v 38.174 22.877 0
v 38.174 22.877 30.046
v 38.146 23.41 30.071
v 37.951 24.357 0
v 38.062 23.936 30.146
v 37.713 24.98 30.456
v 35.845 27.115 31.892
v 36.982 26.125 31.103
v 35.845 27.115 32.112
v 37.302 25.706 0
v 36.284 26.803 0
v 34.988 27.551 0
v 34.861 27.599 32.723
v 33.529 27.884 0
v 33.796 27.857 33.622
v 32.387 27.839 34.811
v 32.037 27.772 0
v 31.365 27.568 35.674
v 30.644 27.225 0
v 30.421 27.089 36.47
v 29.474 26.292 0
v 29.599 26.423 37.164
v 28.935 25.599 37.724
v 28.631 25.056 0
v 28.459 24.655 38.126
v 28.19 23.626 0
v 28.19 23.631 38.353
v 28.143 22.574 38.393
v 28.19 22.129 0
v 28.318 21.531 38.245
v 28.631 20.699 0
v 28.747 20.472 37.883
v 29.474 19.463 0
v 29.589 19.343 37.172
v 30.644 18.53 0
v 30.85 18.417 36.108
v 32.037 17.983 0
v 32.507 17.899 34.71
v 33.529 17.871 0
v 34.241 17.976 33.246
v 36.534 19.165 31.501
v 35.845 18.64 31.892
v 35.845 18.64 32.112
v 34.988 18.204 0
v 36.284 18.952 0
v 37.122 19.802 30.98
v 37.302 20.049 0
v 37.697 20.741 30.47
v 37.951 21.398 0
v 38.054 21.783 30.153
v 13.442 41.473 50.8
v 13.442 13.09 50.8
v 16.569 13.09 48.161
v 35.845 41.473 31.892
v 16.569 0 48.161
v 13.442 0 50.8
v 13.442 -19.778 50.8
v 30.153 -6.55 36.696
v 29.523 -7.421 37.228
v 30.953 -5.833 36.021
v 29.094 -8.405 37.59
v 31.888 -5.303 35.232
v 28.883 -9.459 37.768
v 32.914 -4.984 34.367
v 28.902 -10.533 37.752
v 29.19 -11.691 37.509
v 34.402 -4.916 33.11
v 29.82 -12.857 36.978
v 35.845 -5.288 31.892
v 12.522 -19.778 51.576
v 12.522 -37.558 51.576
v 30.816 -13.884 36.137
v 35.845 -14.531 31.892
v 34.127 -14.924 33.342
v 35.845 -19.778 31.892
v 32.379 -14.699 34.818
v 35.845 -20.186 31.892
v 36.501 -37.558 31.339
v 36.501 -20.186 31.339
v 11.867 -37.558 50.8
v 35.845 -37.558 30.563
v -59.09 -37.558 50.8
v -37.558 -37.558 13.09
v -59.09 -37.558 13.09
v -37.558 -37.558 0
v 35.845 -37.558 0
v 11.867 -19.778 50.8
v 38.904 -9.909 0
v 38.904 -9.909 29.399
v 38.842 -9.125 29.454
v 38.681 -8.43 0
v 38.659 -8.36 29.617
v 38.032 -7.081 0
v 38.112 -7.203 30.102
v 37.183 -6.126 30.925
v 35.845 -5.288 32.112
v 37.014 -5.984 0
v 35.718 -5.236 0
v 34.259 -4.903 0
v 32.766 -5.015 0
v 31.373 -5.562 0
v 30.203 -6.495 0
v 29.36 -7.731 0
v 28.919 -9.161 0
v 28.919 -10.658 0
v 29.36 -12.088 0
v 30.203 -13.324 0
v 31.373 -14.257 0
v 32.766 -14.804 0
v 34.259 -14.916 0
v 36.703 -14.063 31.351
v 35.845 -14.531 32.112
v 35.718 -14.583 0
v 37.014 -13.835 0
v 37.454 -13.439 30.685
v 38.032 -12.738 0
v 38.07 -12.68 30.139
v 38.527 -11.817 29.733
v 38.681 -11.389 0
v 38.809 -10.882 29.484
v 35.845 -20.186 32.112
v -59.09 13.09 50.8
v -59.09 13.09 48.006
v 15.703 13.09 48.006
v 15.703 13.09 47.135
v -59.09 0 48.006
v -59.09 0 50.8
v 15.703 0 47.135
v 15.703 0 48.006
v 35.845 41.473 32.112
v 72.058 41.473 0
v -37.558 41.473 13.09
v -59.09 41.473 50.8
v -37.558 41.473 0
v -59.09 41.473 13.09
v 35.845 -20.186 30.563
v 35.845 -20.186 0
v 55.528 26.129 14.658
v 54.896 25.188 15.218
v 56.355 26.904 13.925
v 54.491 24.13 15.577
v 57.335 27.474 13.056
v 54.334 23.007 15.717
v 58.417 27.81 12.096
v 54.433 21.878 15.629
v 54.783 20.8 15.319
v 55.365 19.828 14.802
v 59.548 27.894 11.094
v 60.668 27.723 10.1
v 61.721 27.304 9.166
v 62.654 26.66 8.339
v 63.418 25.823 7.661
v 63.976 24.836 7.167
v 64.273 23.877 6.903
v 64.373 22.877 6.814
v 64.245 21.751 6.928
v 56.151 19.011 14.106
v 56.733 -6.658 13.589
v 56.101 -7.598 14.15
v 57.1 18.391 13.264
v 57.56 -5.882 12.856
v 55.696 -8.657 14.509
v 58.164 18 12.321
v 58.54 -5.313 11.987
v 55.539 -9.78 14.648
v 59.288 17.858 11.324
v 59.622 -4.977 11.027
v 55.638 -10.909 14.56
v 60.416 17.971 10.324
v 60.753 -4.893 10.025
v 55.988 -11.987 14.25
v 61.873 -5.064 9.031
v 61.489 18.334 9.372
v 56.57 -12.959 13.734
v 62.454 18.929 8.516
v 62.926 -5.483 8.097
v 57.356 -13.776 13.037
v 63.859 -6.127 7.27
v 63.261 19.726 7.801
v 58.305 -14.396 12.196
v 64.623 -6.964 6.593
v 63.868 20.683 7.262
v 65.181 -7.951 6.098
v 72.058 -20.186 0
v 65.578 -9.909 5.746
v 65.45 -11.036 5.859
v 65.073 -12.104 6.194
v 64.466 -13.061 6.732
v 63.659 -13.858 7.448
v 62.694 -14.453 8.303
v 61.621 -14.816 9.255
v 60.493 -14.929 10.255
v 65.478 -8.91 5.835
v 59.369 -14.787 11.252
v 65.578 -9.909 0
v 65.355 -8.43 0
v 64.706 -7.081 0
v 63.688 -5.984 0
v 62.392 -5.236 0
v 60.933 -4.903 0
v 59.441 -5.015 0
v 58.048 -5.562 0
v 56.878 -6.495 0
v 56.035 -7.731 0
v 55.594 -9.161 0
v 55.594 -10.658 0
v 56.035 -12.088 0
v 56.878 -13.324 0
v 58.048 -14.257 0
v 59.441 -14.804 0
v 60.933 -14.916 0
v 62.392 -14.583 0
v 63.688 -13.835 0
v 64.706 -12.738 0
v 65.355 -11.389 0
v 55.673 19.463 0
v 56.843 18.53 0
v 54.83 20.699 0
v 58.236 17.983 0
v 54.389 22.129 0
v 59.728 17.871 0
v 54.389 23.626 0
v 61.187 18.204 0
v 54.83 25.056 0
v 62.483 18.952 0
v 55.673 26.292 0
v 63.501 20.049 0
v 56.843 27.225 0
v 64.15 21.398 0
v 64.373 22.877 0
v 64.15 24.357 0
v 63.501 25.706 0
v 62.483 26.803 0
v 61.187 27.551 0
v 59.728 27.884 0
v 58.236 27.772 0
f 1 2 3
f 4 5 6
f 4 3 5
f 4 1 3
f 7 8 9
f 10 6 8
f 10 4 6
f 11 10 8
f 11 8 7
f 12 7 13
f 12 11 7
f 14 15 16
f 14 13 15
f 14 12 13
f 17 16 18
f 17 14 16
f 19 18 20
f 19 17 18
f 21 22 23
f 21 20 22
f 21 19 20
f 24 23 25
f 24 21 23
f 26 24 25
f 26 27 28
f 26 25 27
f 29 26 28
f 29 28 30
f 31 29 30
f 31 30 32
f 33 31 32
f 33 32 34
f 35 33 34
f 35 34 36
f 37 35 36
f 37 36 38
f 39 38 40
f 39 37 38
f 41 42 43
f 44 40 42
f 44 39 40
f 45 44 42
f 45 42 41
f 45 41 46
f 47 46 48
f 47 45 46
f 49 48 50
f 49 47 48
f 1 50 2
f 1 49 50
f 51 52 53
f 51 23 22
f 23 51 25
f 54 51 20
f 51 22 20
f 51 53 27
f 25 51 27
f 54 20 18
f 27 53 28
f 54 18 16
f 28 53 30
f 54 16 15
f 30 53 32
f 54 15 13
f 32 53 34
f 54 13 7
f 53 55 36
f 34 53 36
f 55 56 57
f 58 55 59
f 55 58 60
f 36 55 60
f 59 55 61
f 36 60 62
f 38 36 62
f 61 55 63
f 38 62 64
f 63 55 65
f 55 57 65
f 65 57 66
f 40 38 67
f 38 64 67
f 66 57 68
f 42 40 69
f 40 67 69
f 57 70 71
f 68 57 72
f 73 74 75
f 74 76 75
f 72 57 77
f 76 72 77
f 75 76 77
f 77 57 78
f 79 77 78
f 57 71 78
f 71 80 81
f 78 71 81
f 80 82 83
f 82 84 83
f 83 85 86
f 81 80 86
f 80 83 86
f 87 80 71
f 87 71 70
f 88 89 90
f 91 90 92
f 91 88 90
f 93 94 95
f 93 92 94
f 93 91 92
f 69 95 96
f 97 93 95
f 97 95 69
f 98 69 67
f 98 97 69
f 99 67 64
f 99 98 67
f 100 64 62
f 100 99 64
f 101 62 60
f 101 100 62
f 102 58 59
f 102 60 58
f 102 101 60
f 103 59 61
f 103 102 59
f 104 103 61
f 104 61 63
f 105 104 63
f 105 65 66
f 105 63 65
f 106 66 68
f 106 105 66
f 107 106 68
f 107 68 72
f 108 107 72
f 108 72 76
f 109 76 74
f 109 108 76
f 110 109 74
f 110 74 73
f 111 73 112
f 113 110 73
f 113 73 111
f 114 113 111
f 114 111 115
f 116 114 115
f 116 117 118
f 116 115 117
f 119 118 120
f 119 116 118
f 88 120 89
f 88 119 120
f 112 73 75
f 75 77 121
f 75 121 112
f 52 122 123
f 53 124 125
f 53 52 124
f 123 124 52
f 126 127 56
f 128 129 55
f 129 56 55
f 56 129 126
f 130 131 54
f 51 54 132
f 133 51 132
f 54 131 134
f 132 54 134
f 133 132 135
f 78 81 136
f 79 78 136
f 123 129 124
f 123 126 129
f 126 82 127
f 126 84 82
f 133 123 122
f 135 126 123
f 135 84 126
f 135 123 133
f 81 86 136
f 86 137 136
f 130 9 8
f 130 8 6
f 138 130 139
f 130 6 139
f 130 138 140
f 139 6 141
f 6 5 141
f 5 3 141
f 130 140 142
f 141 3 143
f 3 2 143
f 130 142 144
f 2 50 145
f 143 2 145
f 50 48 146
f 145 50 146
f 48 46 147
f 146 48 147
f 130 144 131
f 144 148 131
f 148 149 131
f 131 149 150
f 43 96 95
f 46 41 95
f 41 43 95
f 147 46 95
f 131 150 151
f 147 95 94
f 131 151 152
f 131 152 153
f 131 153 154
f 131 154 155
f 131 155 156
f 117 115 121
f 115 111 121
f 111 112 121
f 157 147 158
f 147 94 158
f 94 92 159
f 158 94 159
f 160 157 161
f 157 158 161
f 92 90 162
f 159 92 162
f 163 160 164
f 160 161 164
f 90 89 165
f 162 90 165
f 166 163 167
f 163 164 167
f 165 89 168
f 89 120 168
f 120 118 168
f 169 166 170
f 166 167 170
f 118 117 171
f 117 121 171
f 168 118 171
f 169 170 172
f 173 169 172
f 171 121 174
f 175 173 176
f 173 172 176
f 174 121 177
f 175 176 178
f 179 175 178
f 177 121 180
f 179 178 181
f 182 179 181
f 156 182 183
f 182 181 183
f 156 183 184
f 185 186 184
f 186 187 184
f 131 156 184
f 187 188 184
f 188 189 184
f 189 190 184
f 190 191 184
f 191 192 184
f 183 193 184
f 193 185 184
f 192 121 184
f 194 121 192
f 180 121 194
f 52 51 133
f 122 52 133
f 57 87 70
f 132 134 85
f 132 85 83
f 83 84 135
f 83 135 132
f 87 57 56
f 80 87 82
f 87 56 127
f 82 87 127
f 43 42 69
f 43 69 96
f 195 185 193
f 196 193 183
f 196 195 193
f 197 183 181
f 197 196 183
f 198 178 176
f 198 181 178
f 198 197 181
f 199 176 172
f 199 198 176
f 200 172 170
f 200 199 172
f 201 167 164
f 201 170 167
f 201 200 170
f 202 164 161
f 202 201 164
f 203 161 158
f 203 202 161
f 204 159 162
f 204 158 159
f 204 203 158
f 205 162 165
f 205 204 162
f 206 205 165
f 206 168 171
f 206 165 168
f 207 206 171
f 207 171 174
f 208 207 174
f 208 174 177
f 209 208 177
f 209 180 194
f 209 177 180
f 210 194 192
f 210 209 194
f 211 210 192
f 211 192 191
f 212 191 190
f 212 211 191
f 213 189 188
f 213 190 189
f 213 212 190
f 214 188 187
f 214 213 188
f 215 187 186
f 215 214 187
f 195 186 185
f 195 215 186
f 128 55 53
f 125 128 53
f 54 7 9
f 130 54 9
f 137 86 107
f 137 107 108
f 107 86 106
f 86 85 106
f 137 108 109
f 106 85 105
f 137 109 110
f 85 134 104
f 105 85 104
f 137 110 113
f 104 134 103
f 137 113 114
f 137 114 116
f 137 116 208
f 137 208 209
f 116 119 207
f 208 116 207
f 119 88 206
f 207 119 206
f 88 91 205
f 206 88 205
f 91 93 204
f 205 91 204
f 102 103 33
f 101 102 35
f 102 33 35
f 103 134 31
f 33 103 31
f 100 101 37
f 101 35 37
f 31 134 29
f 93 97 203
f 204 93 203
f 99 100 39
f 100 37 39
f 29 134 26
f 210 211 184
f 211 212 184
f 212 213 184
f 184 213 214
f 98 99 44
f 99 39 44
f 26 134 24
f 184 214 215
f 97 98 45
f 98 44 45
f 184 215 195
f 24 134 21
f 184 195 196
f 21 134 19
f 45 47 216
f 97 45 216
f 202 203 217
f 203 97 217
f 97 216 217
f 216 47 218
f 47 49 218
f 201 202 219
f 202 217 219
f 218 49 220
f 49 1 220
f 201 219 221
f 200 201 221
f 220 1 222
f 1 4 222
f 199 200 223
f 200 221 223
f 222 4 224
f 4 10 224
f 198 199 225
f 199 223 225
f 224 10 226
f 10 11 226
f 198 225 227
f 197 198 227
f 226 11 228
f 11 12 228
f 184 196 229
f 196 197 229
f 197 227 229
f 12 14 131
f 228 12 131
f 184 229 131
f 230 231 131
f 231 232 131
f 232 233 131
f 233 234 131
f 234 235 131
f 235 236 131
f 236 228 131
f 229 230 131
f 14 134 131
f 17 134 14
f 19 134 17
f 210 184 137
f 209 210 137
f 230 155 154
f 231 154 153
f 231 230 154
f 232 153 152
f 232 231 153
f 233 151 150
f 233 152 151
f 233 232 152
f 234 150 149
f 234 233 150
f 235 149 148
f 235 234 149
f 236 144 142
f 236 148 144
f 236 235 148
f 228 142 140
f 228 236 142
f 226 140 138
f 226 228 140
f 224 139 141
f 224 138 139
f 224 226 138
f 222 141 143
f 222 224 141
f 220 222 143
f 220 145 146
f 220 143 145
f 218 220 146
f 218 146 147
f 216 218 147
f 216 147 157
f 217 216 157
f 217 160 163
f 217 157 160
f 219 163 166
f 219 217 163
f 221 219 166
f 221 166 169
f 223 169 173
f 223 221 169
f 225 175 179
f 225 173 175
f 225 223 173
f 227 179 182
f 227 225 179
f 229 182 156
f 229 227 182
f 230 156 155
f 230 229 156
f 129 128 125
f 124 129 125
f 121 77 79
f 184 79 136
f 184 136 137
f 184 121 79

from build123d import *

# Parameters (mm, degrees)
F0_R      = 5.0203932543
F0_W      = 36.212477833
F0_H      = 17.3722021282
F1_DEPTH  = 50.8
F2_W      = 36.2125001848
F2_H      = 17.3722039908
F3_DEPTH  = 50.8
F5_DEPTH  = 50.8
F7_DEPTH  = 50.8
F8_DEPTH  = 68.58
F9_DEPTH  = 1.016
F11_DEPTH = 63.5
F12_W     = 21.5317420661
F12_H     = 13.0903217942
F13_DEPTH = 76.2
F14_DEPTH = 25.4
F15_W     = 72.532140549
F15_H     = 13.0903217942
F16_DEPTH = 12.7
F17_W     = 4.0916903161
F17_H     = 13.0903217942
F18_DEPTH = 12.7
F19_DEPTH = 6.35
F20_DEPTH = 5.08
F21_DEPTH = 2.2606
F22_DEPTH = 2.032
F23_DEPTH = 1.524
F24_DEPTH = 1.016


with BuildPart() as f1:
    # F0 (on Top) → F1 (new body)
    with BuildSketch(Plane.XY):
        Polygon((-59.0899549425, 41.4730757475), (-59.0899549425, -37.5582128763), (35.8454622328, -37.5582128763), (35.8454622328, -20.1860107481), (72.0579400659, -20.1860107481), (72.0579400659, 41.4730757475), align=None)
        with Locations((33.8835379278, -9.9094957113)):
            Circle(F0_R, mode=Mode.SUBTRACT)
        with Locations((60.5580285192, -9.9094957113)):
            Circle(F0_R, mode=Mode.SUBTRACT)
        with Locations((33.153988421, 22.8774771094)):
            Circle(F0_R, mode=Mode.SUBTRACT)
        with Locations((59.3529156527, 22.8774771094)):
            Circle(F0_R, mode=Mode.SUBTRACT)
        with Locations((53.9517011493, -28.8721118122)):
            Rectangle(F0_W, F0_H)
    extrude(amount=F1_DEPTH)

    # F2 (on face) → F3 (cut)
    with BuildSketch(Plane.XY.offset(50.8)):
        with Locations((53.9516899735, -28.8721108809)):
            Rectangle(F2_W, F2_H)
    extrude(amount=-F3_DEPTH, mode=Mode.SUBTRACT)

    # F4 (on face) → F5 (join)
    with BuildSketch(Plane.XZ.offset(37.5582128763)):
        Polygon((11.8669271469, 50.8), (35.8454398811, 30.5626192379), (35.8454398811, 50.8), align=None)
    extrude(amount=F5_DEPTH)

    # F6 (on face) → F7 (cut)
    with BuildSketch(Plane.XY):
        Polygon((-59.0899549425, 40.9865353048), (-60.1052679121, 25.7568676025), (-59.0899549425, 25.7568676025), align=None)
        Polygon((-59.0484701097, 41.6088066995), (-59.0575188558, 41.4730757475), (-25.7593989372, 41.4730757475), (-25.7593989372, 41.6088066995), align=None)
        Polygon((-59.0899549425, 40.9865353048), (-59.0899549425, 25.7568676025), (-25.7593989372, 25.7568676025), (-25.7593989372, 41.4730757475), (-59.0575188558, 41.4730757475), align=None)
    extrude(amount=-F7_DEPTH, mode=Mode.SUBTRACT)

    # F8 (cut): a face of the model
    f8_faces = [f1.faces().sort_by_distance(p)[0] for p in [
        (27.852602303, -88.3582128763, 44.0542064126),
    ]]
    extrude(f8_faces, amount=-F8_DEPTH, mode=Mode.SUBTRACT)

    # F9 (add): a face of the model
    f9_faces = [f1.faces().sort_by_distance(p)[0] for p in [
        (23.856183514, -28.6682128763, 40.681309619),
    ]]
    extrude(f9_faces, amount=F9_DEPTH)

    # F8_face1 (on face) + F10 (on face) → F11 (cut)
    with BuildSketch(Plane(origin=(28.3776884562, -19.7782128763, 44.4973685275), x_dir=(1, 0, 0), z_dir=(0, -1, 0))):
        Polygon((7.4677514249, -12.6052629449), (7.4677514249, 6.3026314725), (-14.9355028497, 6.3026314725), align=None)
    with BuildSketch(Plane.XZ.offset(20.1860088855)):
        Polygon((35.8454398811, 32.1115117159), (72.0579400659, 0), (72.0579400659, 50.8), (35.8454398811, 50.8), align=None)
    extrude(amount=-F11_DEPTH, mode=Mode.SUBTRACT)

    # F12 (on face) → F13 (cut)
    with BuildSketch(Plane.XZ.offset(37.5582128763)):
        with Locations((-48.3240839094, 6.5451608971)):
            Rectangle(F12_W, F12_H)
    extrude(amount=-F13_DEPTH, mode=Mode.SUBTRACT)

    # F14 (cut): a face of the model
    f14_faces = [f1.faces().sort_by_distance(p)[0] for p in [
        (-48.3240839094, 38.6417871237, 6.5451608971),
    ]]
    extrude(f14_faces, amount=-F14_DEPTH, mode=Mode.SUBTRACT)

    # F15 (on face) → F16 (cut)
    with BuildSketch(Plane.XY.offset(50.8)):
        with Locations((-22.823884668, 6.5451608971)):
            Rectangle(F15_W, F15_H)
    extrude(amount=-F16_DEPTH, mode=Mode.SUBTRACT)

    # F17 (on face) → F18 (cut)
    with BuildSketch(Plane(origin=(30.6307366038, 0, 36.2932098944), x_dir=(0.7642049157, 0, -0.6449735241), z_dir=(0.6449735241, 0, 0.7642049157))):
        with Locations((-20.446225546, 6.5451608971)):
            Rectangle(F17_W, F17_H)
    extrude(amount=-F18_DEPTH, mode=Mode.SUBTRACT)

    # F19 (add): a face of the model
    f19_faces = [f1.faces().sort_by_distance(p)[0] for p in [
        (-22.823884668, 6.5451608971, 38.1),
    ]]
    extrude(f19_faces, amount=F19_DEPTH)

    # F20 (add): a face of the model
    f20_faces = [f1.faces().sort_by_distance(p)[0] for p in [
        (-22.823884668, 6.5451608971, 44.45),
    ]]
    extrude(f20_faces, amount=F20_DEPTH)

    # F21 (add): a face of the model
    f21_faces = [f1.faces().sort_by_distance(p)[0] for p in [
        (13.4421856065, 6.5451608971, 46.9930168384),
    ]]
    extrude(f21_faces, amount=F21_DEPTH)

    # F22 (cut): a face of the model
    f22_faces = [f1.faces().sort_by_distance(p)[0] for p in [
        (-21.693584668, 6.5451608971, 49.53),
    ]]
    extrude(f22_faces, amount=-F22_DEPTH, mode=Mode.SUBTRACT)

    # F23 (add): a face of the model
    f23_faces = [f1.faces().sort_by_distance(p)[0] for p in [
        (-21.693584668, 6.5451608971, 47.498),
    ]]
    extrude(f23_faces, amount=F23_DEPTH)

    # F24 (cut): a face of the model
    f24_faces = [f1.faces().sort_by_distance(p)[0] for p in [
        (-21.693584668, 6.5451608971, 49.022),
    ]]
    extrude(f24_faces, amount=-F24_DEPTH, mode=Mode.SUBTRACT)


solid = f1.part
